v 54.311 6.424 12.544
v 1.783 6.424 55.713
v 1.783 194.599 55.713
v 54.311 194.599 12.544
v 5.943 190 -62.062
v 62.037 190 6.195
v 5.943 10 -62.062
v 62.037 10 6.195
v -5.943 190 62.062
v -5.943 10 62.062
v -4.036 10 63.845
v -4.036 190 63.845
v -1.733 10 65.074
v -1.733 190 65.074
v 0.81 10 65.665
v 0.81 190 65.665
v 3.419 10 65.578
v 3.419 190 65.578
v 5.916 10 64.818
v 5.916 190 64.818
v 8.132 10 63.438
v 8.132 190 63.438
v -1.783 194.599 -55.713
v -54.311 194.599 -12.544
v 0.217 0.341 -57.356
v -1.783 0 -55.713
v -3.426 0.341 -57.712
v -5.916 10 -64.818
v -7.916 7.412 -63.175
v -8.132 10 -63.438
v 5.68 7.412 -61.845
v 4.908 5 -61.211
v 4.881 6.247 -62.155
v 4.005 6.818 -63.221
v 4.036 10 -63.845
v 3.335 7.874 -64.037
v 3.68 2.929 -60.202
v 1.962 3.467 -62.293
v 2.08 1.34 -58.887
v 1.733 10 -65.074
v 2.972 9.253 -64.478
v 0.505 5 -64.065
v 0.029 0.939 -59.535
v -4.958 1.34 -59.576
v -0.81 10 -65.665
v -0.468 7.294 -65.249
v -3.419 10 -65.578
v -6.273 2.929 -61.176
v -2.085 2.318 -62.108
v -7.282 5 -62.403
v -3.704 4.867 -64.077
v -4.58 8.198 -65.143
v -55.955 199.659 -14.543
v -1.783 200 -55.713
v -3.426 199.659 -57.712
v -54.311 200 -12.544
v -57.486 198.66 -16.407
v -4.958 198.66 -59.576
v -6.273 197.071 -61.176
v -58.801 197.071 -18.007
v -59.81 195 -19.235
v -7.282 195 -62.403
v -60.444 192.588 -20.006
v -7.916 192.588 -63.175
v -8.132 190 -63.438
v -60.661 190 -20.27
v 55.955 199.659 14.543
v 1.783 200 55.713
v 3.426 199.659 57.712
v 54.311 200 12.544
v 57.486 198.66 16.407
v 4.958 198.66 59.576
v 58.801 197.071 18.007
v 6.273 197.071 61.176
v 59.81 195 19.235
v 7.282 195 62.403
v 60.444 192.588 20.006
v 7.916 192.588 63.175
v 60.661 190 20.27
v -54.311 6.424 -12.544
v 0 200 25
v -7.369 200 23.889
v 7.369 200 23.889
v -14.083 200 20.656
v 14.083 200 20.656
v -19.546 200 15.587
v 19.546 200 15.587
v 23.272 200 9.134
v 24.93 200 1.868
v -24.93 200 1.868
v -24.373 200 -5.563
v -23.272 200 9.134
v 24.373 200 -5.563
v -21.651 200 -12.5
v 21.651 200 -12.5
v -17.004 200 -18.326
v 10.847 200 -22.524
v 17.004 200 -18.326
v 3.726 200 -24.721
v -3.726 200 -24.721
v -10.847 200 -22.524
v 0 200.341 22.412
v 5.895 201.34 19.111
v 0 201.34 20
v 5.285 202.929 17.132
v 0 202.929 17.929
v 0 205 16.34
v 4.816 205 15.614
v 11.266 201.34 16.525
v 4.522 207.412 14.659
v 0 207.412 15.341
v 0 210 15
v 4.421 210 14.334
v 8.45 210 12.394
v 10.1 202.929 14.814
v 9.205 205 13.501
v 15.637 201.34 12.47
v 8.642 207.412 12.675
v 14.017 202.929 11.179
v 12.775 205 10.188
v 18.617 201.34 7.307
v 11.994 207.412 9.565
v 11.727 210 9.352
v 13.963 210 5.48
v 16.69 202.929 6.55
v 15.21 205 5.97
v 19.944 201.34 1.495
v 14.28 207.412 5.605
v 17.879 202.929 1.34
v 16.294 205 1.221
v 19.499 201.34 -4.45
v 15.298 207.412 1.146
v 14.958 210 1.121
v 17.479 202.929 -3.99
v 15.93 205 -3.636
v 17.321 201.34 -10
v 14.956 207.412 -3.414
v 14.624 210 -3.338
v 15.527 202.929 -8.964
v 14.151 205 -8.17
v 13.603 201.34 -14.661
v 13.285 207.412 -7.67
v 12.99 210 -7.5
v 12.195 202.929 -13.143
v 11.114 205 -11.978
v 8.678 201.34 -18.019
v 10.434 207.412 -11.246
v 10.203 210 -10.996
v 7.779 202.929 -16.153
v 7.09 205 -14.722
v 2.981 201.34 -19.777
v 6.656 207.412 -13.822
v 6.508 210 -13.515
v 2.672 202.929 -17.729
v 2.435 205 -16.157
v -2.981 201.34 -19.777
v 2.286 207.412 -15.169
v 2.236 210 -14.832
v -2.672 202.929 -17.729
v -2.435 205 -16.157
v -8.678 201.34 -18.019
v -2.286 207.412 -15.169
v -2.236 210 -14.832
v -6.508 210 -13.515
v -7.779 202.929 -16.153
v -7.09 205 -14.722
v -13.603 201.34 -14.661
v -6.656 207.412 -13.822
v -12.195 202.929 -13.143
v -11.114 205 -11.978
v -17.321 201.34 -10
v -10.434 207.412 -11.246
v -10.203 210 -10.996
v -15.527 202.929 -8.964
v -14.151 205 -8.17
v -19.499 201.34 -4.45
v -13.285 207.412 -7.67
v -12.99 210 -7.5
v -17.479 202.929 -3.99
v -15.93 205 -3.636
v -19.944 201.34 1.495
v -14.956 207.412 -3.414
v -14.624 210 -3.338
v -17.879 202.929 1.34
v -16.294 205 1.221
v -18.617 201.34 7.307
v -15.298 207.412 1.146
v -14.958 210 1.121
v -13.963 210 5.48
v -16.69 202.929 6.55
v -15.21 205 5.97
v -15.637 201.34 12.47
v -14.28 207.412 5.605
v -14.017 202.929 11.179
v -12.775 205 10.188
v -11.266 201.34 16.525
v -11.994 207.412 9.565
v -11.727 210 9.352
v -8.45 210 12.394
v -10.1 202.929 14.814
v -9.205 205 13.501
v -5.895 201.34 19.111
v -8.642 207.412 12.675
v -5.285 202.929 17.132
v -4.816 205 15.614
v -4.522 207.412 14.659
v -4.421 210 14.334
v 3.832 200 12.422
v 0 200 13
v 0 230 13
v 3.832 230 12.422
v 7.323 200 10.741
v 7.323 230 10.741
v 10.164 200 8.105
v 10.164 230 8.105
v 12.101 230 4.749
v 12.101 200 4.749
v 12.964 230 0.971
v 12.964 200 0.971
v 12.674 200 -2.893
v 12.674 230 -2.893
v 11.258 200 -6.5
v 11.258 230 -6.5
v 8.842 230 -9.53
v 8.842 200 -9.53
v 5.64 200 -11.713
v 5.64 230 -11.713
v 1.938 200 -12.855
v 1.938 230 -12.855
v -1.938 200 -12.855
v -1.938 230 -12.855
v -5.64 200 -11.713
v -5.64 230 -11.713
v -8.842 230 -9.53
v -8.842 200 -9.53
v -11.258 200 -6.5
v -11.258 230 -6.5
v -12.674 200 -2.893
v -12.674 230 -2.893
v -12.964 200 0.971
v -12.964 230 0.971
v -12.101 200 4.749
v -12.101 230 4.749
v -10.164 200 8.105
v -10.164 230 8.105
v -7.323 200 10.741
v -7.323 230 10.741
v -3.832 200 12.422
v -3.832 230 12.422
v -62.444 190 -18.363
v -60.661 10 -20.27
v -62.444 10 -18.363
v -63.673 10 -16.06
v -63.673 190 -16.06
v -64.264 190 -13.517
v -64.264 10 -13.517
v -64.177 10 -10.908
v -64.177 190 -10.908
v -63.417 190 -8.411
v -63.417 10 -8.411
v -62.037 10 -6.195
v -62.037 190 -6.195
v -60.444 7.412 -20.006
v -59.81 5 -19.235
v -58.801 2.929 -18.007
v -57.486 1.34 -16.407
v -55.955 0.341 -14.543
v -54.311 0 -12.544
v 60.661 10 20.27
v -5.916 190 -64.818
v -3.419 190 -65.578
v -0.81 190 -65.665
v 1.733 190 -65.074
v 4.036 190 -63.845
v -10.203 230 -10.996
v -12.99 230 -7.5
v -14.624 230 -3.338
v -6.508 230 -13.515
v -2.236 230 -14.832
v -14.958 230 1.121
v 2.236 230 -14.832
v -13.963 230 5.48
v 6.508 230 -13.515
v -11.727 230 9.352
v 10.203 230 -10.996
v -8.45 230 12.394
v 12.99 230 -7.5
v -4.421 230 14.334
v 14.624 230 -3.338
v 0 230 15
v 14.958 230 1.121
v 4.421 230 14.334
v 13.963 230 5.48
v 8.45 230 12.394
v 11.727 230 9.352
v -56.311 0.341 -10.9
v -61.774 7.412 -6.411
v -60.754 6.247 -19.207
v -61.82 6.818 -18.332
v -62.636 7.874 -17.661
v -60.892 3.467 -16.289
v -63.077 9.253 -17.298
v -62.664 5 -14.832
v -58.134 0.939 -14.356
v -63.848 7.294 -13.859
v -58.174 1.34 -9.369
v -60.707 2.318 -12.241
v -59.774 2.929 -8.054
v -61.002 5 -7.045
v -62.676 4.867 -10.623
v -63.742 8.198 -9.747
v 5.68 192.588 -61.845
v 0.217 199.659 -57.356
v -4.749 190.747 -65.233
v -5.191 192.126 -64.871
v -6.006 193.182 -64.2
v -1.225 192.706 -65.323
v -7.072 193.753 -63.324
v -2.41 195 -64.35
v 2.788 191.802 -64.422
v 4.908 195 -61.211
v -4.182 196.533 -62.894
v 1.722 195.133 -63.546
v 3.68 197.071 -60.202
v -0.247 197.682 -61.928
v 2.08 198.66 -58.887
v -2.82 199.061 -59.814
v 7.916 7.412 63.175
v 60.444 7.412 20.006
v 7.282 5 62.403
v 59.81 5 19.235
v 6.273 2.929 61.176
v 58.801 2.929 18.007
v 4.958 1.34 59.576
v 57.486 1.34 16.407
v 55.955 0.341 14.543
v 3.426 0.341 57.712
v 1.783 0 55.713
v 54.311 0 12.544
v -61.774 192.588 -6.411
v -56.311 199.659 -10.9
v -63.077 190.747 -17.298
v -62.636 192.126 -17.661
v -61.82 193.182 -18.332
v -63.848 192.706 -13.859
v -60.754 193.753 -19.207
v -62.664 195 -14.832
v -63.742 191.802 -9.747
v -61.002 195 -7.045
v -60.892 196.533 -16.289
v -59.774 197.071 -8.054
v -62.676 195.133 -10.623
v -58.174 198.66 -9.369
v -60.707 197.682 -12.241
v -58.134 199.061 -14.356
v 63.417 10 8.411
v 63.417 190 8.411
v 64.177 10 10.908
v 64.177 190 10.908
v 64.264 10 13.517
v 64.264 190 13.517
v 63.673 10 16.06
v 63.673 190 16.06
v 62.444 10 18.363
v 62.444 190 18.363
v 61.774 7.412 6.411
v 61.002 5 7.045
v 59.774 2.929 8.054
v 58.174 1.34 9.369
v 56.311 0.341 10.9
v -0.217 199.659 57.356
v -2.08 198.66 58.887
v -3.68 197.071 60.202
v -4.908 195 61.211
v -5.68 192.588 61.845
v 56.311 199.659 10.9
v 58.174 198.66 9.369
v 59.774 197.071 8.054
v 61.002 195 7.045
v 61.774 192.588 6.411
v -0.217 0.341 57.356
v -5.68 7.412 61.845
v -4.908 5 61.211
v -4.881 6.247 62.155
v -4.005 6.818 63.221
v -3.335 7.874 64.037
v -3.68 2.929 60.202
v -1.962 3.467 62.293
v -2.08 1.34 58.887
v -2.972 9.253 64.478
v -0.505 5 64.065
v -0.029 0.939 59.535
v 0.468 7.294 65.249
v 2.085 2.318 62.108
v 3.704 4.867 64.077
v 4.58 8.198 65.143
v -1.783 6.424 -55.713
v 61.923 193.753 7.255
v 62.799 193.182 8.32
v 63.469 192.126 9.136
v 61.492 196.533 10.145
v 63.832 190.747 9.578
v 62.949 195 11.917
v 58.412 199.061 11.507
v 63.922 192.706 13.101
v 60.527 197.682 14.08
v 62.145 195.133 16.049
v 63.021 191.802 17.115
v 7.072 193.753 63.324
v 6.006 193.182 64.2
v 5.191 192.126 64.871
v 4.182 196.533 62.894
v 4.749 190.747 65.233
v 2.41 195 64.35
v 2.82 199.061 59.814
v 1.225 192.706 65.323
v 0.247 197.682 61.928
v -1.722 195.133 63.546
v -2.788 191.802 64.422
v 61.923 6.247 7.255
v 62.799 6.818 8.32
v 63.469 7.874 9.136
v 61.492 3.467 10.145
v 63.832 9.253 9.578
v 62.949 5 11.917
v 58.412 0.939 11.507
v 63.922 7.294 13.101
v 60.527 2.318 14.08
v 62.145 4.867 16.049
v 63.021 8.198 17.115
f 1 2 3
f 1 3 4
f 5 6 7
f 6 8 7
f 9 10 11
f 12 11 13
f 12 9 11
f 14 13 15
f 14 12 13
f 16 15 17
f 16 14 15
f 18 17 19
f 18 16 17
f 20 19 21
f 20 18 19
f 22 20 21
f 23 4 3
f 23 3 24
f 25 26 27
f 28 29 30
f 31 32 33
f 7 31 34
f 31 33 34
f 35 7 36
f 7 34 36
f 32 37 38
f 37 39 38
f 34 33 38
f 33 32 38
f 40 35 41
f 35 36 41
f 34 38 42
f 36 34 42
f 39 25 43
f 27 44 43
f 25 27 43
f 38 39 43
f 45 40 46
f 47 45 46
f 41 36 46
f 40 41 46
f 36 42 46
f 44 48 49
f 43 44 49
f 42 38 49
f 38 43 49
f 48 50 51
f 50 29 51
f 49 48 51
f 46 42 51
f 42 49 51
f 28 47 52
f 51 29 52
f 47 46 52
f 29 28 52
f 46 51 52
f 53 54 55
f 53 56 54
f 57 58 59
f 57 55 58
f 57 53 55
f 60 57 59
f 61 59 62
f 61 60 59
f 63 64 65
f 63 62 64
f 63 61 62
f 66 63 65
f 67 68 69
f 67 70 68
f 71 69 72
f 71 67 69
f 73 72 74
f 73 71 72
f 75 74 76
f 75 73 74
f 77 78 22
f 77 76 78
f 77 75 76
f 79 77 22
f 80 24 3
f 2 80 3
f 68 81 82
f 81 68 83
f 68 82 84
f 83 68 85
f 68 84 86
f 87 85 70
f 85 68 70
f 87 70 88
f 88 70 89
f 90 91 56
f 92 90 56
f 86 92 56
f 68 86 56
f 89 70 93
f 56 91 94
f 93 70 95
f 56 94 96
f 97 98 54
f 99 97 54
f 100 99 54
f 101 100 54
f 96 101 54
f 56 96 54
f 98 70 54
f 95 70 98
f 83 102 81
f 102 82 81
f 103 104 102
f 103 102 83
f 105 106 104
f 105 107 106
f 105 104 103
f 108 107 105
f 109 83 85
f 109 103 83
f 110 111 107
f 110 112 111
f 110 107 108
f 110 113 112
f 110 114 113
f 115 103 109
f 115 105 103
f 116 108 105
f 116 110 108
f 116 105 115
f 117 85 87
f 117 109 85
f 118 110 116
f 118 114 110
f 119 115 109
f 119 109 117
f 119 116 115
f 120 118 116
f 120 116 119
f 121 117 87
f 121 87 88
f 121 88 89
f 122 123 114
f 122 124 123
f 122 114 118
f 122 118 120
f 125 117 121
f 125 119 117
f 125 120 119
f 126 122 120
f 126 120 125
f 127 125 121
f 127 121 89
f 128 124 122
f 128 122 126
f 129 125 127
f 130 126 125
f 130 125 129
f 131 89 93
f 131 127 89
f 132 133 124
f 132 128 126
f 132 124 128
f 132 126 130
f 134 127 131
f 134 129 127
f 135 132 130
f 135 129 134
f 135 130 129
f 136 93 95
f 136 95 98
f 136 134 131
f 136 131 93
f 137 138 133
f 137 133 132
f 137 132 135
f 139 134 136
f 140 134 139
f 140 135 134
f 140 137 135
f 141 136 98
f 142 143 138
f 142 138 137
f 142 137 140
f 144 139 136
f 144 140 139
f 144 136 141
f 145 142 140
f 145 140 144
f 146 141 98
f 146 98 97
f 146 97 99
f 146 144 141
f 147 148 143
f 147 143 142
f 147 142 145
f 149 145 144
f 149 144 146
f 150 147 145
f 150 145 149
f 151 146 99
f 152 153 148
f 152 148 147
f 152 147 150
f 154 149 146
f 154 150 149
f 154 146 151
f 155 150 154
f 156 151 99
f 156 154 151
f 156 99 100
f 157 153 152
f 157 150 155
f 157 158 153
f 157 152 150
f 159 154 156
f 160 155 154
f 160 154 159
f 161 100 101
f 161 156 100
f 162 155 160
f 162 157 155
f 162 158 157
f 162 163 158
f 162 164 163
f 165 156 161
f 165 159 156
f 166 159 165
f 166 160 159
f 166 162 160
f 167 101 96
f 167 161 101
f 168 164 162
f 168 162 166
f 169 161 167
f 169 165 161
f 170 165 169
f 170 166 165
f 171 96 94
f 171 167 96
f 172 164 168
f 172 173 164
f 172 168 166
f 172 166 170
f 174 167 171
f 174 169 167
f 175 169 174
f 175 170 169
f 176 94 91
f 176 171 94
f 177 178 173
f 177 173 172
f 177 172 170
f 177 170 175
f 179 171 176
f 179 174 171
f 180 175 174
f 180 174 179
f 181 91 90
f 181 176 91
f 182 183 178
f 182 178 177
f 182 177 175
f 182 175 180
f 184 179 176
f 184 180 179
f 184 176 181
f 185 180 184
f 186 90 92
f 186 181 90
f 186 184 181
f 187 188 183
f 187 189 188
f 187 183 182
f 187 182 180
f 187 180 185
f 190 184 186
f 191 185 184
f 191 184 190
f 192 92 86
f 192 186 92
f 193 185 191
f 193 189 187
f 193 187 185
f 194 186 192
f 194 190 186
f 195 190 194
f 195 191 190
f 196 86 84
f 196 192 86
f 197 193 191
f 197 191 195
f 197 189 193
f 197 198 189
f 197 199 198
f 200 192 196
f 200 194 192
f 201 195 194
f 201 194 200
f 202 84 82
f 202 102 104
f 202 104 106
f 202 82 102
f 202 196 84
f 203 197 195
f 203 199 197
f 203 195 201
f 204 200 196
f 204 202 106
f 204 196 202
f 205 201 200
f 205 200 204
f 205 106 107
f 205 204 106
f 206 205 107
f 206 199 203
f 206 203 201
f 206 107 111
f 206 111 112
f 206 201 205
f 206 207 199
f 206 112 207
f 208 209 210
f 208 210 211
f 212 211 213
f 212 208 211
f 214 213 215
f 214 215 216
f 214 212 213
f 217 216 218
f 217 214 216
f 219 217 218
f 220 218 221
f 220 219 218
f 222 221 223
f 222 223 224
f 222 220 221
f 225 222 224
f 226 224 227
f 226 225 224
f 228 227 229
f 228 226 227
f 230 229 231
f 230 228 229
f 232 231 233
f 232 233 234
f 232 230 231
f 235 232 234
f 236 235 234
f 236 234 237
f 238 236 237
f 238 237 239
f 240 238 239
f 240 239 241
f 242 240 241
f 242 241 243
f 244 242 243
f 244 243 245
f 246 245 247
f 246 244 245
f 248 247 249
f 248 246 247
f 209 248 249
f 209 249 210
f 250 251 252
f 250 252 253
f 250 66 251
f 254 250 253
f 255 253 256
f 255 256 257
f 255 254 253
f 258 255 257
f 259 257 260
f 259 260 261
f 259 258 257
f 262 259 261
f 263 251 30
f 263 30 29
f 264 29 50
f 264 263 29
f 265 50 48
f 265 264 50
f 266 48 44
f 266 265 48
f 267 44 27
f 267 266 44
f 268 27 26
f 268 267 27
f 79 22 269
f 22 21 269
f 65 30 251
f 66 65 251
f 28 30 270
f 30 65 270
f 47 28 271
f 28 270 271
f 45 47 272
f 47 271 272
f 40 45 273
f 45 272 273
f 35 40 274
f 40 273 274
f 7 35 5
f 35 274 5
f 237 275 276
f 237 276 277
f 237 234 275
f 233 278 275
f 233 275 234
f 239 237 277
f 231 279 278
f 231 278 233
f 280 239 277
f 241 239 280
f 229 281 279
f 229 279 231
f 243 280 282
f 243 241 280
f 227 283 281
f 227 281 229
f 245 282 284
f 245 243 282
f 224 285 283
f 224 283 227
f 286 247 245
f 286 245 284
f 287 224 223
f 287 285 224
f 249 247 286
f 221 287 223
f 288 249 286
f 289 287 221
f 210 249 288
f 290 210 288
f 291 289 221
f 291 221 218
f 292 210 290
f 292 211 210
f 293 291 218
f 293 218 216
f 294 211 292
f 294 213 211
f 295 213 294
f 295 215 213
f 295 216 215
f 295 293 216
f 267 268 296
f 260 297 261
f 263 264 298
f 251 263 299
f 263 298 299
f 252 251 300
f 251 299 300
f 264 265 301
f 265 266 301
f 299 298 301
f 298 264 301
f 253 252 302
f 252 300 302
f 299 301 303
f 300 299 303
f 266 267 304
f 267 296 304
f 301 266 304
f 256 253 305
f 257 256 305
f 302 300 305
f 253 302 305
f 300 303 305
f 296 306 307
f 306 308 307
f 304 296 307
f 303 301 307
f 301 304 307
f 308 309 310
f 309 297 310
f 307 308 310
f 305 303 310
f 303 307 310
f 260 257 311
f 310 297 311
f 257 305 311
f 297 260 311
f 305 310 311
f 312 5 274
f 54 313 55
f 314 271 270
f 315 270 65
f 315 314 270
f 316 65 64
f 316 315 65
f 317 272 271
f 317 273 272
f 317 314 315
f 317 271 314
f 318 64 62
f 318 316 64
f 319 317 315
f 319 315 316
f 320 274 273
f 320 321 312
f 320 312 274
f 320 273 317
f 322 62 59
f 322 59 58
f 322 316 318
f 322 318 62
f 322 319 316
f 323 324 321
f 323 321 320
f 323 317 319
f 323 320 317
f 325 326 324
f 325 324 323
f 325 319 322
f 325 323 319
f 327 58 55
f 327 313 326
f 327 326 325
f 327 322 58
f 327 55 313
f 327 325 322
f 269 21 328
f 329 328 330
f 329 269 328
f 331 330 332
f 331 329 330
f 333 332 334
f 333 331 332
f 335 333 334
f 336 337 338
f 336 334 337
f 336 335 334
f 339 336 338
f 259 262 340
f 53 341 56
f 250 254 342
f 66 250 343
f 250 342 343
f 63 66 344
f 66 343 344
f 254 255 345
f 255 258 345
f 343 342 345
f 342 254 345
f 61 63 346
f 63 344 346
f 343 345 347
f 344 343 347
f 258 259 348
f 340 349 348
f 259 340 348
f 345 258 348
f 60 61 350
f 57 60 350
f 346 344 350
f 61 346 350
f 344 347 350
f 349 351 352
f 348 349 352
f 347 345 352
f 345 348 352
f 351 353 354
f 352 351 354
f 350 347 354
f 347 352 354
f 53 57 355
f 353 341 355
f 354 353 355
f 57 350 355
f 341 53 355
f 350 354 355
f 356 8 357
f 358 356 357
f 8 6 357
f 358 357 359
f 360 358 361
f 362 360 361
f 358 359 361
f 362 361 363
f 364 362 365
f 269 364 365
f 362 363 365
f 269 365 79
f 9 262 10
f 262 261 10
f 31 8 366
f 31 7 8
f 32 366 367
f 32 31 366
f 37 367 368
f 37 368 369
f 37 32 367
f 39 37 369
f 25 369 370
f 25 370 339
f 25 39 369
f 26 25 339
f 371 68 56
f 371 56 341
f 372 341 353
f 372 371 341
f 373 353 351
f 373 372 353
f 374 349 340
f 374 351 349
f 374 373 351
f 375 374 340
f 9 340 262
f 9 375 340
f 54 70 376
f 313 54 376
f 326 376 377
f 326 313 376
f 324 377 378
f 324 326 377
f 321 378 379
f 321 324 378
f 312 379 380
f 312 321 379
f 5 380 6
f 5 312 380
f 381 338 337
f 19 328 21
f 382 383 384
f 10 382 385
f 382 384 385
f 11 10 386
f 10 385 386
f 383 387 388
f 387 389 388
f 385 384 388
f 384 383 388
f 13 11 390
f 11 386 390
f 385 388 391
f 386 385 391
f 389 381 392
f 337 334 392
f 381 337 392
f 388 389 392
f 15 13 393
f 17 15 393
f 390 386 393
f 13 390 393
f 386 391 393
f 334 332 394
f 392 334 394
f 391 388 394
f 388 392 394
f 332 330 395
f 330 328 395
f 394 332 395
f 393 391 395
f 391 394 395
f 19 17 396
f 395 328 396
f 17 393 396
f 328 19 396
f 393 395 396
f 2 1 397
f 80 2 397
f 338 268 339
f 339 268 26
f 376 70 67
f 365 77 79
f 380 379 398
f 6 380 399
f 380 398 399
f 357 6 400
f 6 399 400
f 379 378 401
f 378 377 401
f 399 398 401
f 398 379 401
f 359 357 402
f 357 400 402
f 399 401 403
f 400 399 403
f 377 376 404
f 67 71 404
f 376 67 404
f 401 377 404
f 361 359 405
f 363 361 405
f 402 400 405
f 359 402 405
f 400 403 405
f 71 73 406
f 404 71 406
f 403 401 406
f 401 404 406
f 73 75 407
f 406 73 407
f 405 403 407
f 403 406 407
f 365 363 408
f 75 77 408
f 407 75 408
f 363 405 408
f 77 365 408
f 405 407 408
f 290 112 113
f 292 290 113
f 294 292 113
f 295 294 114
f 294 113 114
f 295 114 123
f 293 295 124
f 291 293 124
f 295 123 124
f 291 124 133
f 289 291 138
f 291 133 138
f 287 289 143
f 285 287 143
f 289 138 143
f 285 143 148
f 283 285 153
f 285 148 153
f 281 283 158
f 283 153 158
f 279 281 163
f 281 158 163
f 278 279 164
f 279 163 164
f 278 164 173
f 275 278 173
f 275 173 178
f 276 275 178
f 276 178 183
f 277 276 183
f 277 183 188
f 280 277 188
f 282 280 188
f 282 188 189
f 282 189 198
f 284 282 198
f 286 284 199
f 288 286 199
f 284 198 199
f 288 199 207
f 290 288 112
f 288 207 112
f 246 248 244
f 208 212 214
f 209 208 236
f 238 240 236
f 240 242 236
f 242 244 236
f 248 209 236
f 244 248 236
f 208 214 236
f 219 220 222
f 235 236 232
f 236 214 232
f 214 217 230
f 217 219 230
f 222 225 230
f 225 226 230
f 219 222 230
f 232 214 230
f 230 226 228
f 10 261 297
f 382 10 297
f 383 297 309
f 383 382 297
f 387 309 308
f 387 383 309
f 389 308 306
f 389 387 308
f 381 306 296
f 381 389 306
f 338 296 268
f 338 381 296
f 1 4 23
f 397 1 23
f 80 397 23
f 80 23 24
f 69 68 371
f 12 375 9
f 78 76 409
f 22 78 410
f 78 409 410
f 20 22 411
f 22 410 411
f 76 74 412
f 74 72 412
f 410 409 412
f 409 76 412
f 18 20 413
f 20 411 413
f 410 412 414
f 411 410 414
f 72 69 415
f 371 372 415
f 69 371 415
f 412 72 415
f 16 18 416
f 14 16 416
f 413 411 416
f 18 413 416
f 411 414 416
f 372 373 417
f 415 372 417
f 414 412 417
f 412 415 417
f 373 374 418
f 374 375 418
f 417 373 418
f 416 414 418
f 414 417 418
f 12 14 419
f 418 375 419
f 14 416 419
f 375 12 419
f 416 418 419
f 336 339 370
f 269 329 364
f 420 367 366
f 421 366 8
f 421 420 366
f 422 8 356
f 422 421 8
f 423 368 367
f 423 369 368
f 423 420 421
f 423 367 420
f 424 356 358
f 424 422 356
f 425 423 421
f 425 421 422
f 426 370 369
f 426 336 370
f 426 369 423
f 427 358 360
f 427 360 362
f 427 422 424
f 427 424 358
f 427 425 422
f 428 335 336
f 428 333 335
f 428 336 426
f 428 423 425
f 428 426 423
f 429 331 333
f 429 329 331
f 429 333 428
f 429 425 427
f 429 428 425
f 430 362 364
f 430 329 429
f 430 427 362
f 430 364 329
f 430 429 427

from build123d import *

# Parameters (mm, degrees)
BOSS_EXTRUDE2_DEPTH = 200
BOSS_EXTRUDE3_DEPTH = 200
BOSS_EXTRUDE4_DEPTH = 200
BOSS_EXTRUDE5_REACH = 247.011
SKETCH2_W           = 108.348849956
SKETCH2_H           = 6.424491228
SKETCH2_H_2         = 5.401330914
SKETCH3_R           = 15
SKETCH3_R_2         = 13
BOSS_EXTRUDE6_DEPTH = 30
FILLET4_R           = 10
FILLET5_R           = 10


with BuildPart() as part:
    # Sketch1 → Boss-Extrude2 (new body)
    with BuildSketch(Plane(origin=(0, 0, 0), x_dir=(1, 0, 0), z_dir=(0, 1, 0))):
        Polygon((-0.406350975, 69.787624434), (-68.386407424, 13.920378043), (0.406350975, -69.787624434), (68.386407424, -13.920378043), align=None)
        Polygon((54.311430077, -12.543783452), (-1.782945566, 55.712647086), (-54.311430077, 12.543783452), (1.782945566, -55.712647086), align=None, mode=Mode.SUBTRACT)
    extrude(amount=BOSS_EXTRUDE2_DEPTH)

    # Sketch1<2> → Boss-Extrude3 (add)
    with BuildSketch(Plane(origin=(0, 0, 0), x_dir=(1, 0, 0), z_dir=(0, 1, 0))):
        Polygon((-0.406350975, 69.787624434), (-68.386407424, 13.920378043), (0.406350975, -69.787624434), (68.386407424, -13.920378043), align=None)
        Polygon((54.311430077, -12.543783452), (-1.782945566, 55.712647086), (-54.311430077, 12.543783452), (1.782945566, -55.712647086), align=None, mode=Mode.SUBTRACT)
    extrude(amount=BOSS_EXTRUDE3_DEPTH)

    # Sketch1<4> → Boss-Extrude4 (add)
    with BuildSketch(Plane(origin=(0, 0, 0), x_dir=(1, 0, 0), z_dir=(0, 1, 0))):
        Polygon((-0.406350975, 69.787624434), (-68.386407424, 13.920378043), (0.406350975, -69.787624434), (68.386407424, -13.920378043), align=None)
        Polygon((54.311430077, -12.543783452), (-1.782945566, 55.712647086), (-54.311430077, 12.543783452), (1.782945566, -55.712647086), align=None, mode=Mode.SUBTRACT)
    extrude(amount=BOSS_EXTRUDE4_DEPTH)

    # Sketch2 → Boss-Extrude5 (add, up to next)
    with BuildSketch(Plane(origin=(33.990028225, 0, -27.933623196), x_dir=(-0.6349191378309257, 0, -0.7725785969181609), z_dir=(0.772578596918161, 0, -0.6349191378309257)), mode=Mode.PRIVATE) as boss_extrude5_sk1:
        with Locations((0, 3.212245614)):
            Rectangle(SKETCH2_W, SKETCH2_H)
    boss_extrude5_tool1 = extrude(boss_extrude5_sk1.sketch, amount=-BOSS_EXTRUDE5_REACH, mode=Mode.PRIVATE) - part.part
    # Sketch2 → Boss-Extrude5 (add, up to next)
    with BuildSketch(Plane(origin=(33.990028225, 0, -27.933623196), x_dir=(-0.6349191378309257, 0, -0.7725785969181609), z_dir=(0.772578596918161, 0, -0.6349191378309257)), mode=Mode.PRIVATE) as boss_extrude5_sk2:
        with Locations((0, 197.299334543)):
            Rectangle(SKETCH2_W, SKETCH2_H_2)
    boss_extrude5_tool2 = extrude(boss_extrude5_sk2.sketch, amount=-BOSS_EXTRUDE5_REACH, mode=Mode.PRIVATE) - part.part
    add(boss_extrude5_tool1.solids().sort_by_distance((33.990028, 3.212246, -27.933623))[0])
    add(boss_extrude5_tool2.solids().sort_by_distance((33.990028, 197.299335, -27.933623))[0])

    # Sketch3 → Boss-Extrude6 (add)
    with BuildSketch(Plane(origin=(0, 200, 0), x_dir=(1, 0, 0), z_dir=(0, 1, 0))):
        Circle(SKETCH3_R)
        Circle(SKETCH3_R_2, mode=Mode.SUBTRACT)
    extrude(amount=BOSS_EXTRUDE6_DEPTH)

    # Fillet4
    fillet4_edges = [part.edges().sort_by_distance(p)[0] for p in [
        (-15, 200, 0),
    ]]
    fillet(fillet4_edges, radius=FILLET4_R)

    # Fillet5
    fillet5_edges = [part.edges().sort_by_distance(p)[0] for p in [
        (-33.990028225, 0, 27.933623196),
        (-68.386407424, 100, -13.920378043),
        (-34.396379199, 0, -41.854001238),
        (0.406350975, 100, 69.787624434),
        (34.396379199, 0, 41.854001238),
        (68.386407424, 100, 13.920378043),
        (-0.406350975, 100, -69.787624434),
        (33.990028225, 0, -27.933623196),
        (34.396379199, 200, 41.854001238),
        (-33.990028225, 200, 27.933623196),
        (-34.396379199, 200, -41.854001238),
        (33.990028225, 200, -27.933623196),
    ]]
    fillet(fillet5_edges, radius=FILLET5_R)


solid = part.part
